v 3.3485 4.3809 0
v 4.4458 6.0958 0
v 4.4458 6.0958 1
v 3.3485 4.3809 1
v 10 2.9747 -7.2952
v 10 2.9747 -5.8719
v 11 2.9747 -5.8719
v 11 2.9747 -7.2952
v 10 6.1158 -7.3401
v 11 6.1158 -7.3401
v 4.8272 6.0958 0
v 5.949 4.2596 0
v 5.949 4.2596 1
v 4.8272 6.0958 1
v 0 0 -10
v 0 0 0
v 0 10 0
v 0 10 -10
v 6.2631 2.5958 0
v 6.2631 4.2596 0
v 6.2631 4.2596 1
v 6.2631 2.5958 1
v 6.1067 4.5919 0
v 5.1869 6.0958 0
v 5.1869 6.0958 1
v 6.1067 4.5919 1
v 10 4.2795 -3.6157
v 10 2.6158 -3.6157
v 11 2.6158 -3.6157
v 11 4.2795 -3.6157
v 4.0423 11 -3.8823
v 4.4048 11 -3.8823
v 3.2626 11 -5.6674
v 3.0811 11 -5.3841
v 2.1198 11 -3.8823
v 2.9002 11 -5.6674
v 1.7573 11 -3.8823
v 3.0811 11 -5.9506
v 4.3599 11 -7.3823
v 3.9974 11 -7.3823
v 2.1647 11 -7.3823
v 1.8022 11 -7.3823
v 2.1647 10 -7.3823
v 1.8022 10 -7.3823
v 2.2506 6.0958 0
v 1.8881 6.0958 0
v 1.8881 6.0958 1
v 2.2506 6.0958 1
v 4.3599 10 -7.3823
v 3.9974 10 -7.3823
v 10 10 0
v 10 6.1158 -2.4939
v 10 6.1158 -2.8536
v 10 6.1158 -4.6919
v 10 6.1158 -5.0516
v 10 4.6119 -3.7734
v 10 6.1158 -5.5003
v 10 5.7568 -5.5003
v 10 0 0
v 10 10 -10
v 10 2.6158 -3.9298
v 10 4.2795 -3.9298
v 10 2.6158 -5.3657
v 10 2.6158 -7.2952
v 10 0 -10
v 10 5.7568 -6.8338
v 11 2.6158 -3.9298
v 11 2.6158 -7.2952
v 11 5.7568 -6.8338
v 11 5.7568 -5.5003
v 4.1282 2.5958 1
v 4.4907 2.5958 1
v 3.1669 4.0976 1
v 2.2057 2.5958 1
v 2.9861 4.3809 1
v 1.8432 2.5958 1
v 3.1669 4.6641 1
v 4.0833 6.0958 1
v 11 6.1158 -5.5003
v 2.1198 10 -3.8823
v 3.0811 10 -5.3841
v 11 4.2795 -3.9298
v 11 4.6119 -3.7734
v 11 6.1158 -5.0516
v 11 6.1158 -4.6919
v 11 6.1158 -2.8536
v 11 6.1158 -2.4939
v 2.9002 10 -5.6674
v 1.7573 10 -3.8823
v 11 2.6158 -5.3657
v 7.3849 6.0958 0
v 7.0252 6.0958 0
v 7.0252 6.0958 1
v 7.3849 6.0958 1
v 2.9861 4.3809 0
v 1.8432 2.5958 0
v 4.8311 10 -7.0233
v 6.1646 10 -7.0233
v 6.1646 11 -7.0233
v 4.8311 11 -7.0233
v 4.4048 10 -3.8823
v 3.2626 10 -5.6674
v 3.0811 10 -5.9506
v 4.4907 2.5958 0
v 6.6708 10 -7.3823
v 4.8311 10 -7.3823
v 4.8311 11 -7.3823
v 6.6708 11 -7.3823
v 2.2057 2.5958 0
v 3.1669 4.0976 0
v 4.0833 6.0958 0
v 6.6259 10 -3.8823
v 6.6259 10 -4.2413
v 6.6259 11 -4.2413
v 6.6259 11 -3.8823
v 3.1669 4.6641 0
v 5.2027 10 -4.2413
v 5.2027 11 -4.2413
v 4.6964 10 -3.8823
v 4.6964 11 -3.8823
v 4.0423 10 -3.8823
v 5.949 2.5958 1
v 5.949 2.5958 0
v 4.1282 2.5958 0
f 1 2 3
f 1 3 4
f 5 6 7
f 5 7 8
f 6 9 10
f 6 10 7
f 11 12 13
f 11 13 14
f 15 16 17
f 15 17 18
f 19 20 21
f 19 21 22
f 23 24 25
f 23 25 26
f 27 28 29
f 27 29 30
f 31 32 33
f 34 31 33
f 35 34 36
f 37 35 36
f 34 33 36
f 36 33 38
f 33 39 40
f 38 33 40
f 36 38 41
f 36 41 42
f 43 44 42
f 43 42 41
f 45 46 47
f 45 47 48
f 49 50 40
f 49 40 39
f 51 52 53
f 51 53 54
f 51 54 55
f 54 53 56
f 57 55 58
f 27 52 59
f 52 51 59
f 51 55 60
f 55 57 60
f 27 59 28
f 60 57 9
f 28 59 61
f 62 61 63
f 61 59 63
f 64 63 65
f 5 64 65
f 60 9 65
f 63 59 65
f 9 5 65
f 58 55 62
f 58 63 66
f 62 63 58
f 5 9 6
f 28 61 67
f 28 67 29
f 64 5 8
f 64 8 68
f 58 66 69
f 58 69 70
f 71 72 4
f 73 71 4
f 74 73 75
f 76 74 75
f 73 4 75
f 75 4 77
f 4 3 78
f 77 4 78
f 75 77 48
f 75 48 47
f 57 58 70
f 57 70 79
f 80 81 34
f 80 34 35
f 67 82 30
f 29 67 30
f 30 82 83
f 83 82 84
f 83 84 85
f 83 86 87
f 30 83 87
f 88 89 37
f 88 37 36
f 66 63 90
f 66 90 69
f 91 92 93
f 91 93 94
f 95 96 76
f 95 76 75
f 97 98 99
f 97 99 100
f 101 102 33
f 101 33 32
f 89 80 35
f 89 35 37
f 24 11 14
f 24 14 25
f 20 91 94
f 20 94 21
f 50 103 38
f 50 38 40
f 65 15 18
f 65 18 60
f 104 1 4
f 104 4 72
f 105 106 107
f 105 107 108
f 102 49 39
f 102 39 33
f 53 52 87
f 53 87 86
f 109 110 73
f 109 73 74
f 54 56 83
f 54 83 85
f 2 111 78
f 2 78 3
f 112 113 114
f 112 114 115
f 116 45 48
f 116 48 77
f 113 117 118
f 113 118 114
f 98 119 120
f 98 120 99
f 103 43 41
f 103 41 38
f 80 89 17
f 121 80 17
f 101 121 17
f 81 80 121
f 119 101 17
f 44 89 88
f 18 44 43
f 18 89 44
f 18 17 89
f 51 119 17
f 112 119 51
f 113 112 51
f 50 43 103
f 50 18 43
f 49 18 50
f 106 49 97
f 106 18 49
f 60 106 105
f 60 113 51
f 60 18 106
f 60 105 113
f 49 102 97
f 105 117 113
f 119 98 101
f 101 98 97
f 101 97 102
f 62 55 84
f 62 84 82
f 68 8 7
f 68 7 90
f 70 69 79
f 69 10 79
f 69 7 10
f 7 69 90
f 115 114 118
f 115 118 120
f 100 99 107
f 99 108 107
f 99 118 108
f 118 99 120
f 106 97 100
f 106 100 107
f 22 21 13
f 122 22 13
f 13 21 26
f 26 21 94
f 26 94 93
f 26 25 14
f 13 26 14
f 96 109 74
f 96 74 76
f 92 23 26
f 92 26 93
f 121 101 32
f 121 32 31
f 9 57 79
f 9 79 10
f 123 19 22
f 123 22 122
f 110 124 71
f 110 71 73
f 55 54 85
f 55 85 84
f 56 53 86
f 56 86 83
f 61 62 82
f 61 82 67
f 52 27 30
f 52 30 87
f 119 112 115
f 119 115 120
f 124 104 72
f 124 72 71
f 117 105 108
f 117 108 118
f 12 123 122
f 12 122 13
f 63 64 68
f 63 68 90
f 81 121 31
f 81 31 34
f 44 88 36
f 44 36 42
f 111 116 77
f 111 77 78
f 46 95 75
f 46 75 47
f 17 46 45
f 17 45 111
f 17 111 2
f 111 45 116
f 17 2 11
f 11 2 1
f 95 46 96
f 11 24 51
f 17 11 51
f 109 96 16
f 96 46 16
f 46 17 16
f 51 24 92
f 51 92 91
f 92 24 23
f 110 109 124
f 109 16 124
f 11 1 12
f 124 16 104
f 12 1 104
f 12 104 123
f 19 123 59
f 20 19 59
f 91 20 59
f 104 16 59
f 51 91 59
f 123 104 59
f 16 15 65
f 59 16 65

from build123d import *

# Parameters (mm, degrees)
SKETCH1_W           = 10
SKETCH1_H           = 10
BOSS_EXTRUDE1_DEPTH = 10
BOSS_EXTRUDE2_DEPTH = 1
BOSS_EXTRUDE3_DEPTH = 1
BOSS_EXTRUDE4_DEPTH = 1


with BuildPart() as part:
    # Sketch1 → Boss-Extrude1 (new body)
    with BuildSketch(Plane(origin=(0, 0, 0), x_dir=(1, 0, 0), z_dir=(0, 1, 0))):
        with Locations((5, 5)):
            Rectangle(SKETCH1_W, SKETCH1_H)
    extrude(amount=BOSS_EXTRUDE1_DEPTH)

    # Sketch2 → Boss-Extrude2 (add)
    with BuildSketch(Plane.XY):
        Polygon((1.888096604, 6.09581066), (2.250576572, 6.09581066), (3.166942757, 4.664119955), (4.083308943, 6.09581066), (4.445788911, 6.09581066), (3.348533302, 4.38086675), (4.490660706, 2.59581066), (4.128180738, 2.59581066), (3.166942757, 4.097613545), (2.205704777, 2.59581066), (1.843224809, 2.59581066), (2.986053334, 4.38086675), align=None)
        Polygon((4.827199168, 6.09581066), (5.186874649, 6.09581066), (6.106746443, 4.59190441), (7.025215995, 6.09581066), (7.384891475, 6.09581066), (6.263096604, 4.25957268), (6.263096604, 2.59581066), (5.94899404, 2.59581066), (5.94899404, 4.25957268), align=None)
    extrude(amount=BOSS_EXTRUDE2_DEPTH)

    # Sketch3 → Boss-Extrude3 (add)
    with BuildSketch(Plane(origin=(0, 10, 0), x_dir=(1, 0, 0), z_dir=(0, 1, 0))):
        Polygon((1.802209363, 7.38229402), (2.164689331, 7.38229402), (3.081055517, 5.950603315), (3.997421703, 7.38229402), (4.359901671, 7.38229402), (3.262646062, 5.667350109), (4.404773466, 3.88229402), (4.042293498, 3.88229402), (3.081055517, 5.384096904), (2.119817536, 3.88229402), (1.757337568, 3.88229402), (2.900166094, 5.667350109), align=None)
        Polygon((4.831055517, 7.023319661), (4.831055517, 7.38229402), (6.670799107, 7.38229402), (5.202650068, 4.241268379), (6.625927312, 4.241268379), (6.625927312, 3.88229402), (4.696440132, 3.88229402), (6.164589171, 7.023319661), align=None)
    extrude(amount=BOSS_EXTRUDE3_DEPTH)

    # Sketch4 → Boss-Extrude4 (add)
    with BuildSketch(Plane(origin=(10, 0, 0), x_dir=(0, 0, -1), z_dir=(1, 0, 0))):
        Polygon((2.493902055, 6.115757789), (2.853577536, 6.115757789), (3.773449331, 4.611851539), (4.691918882, 6.115757789), (5.051594363, 6.115757789), (3.929799491, 4.279519808), (3.929799491, 2.615757789), (3.615696927, 2.615757789), (3.615696927, 4.279519808), align=None)
        Polygon((5.500312311, 5.75678343), (5.500312311, 6.115757789), (7.340055901, 6.115757789), (5.871906863, 2.974732148), (7.295184106, 2.974732148), (7.295184106, 2.615757789), (5.365696927, 2.615757789), (6.833845965, 5.75678343), align=None)
    extrude(amount=BOSS_EXTRUDE4_DEPTH)


solid = part.part
